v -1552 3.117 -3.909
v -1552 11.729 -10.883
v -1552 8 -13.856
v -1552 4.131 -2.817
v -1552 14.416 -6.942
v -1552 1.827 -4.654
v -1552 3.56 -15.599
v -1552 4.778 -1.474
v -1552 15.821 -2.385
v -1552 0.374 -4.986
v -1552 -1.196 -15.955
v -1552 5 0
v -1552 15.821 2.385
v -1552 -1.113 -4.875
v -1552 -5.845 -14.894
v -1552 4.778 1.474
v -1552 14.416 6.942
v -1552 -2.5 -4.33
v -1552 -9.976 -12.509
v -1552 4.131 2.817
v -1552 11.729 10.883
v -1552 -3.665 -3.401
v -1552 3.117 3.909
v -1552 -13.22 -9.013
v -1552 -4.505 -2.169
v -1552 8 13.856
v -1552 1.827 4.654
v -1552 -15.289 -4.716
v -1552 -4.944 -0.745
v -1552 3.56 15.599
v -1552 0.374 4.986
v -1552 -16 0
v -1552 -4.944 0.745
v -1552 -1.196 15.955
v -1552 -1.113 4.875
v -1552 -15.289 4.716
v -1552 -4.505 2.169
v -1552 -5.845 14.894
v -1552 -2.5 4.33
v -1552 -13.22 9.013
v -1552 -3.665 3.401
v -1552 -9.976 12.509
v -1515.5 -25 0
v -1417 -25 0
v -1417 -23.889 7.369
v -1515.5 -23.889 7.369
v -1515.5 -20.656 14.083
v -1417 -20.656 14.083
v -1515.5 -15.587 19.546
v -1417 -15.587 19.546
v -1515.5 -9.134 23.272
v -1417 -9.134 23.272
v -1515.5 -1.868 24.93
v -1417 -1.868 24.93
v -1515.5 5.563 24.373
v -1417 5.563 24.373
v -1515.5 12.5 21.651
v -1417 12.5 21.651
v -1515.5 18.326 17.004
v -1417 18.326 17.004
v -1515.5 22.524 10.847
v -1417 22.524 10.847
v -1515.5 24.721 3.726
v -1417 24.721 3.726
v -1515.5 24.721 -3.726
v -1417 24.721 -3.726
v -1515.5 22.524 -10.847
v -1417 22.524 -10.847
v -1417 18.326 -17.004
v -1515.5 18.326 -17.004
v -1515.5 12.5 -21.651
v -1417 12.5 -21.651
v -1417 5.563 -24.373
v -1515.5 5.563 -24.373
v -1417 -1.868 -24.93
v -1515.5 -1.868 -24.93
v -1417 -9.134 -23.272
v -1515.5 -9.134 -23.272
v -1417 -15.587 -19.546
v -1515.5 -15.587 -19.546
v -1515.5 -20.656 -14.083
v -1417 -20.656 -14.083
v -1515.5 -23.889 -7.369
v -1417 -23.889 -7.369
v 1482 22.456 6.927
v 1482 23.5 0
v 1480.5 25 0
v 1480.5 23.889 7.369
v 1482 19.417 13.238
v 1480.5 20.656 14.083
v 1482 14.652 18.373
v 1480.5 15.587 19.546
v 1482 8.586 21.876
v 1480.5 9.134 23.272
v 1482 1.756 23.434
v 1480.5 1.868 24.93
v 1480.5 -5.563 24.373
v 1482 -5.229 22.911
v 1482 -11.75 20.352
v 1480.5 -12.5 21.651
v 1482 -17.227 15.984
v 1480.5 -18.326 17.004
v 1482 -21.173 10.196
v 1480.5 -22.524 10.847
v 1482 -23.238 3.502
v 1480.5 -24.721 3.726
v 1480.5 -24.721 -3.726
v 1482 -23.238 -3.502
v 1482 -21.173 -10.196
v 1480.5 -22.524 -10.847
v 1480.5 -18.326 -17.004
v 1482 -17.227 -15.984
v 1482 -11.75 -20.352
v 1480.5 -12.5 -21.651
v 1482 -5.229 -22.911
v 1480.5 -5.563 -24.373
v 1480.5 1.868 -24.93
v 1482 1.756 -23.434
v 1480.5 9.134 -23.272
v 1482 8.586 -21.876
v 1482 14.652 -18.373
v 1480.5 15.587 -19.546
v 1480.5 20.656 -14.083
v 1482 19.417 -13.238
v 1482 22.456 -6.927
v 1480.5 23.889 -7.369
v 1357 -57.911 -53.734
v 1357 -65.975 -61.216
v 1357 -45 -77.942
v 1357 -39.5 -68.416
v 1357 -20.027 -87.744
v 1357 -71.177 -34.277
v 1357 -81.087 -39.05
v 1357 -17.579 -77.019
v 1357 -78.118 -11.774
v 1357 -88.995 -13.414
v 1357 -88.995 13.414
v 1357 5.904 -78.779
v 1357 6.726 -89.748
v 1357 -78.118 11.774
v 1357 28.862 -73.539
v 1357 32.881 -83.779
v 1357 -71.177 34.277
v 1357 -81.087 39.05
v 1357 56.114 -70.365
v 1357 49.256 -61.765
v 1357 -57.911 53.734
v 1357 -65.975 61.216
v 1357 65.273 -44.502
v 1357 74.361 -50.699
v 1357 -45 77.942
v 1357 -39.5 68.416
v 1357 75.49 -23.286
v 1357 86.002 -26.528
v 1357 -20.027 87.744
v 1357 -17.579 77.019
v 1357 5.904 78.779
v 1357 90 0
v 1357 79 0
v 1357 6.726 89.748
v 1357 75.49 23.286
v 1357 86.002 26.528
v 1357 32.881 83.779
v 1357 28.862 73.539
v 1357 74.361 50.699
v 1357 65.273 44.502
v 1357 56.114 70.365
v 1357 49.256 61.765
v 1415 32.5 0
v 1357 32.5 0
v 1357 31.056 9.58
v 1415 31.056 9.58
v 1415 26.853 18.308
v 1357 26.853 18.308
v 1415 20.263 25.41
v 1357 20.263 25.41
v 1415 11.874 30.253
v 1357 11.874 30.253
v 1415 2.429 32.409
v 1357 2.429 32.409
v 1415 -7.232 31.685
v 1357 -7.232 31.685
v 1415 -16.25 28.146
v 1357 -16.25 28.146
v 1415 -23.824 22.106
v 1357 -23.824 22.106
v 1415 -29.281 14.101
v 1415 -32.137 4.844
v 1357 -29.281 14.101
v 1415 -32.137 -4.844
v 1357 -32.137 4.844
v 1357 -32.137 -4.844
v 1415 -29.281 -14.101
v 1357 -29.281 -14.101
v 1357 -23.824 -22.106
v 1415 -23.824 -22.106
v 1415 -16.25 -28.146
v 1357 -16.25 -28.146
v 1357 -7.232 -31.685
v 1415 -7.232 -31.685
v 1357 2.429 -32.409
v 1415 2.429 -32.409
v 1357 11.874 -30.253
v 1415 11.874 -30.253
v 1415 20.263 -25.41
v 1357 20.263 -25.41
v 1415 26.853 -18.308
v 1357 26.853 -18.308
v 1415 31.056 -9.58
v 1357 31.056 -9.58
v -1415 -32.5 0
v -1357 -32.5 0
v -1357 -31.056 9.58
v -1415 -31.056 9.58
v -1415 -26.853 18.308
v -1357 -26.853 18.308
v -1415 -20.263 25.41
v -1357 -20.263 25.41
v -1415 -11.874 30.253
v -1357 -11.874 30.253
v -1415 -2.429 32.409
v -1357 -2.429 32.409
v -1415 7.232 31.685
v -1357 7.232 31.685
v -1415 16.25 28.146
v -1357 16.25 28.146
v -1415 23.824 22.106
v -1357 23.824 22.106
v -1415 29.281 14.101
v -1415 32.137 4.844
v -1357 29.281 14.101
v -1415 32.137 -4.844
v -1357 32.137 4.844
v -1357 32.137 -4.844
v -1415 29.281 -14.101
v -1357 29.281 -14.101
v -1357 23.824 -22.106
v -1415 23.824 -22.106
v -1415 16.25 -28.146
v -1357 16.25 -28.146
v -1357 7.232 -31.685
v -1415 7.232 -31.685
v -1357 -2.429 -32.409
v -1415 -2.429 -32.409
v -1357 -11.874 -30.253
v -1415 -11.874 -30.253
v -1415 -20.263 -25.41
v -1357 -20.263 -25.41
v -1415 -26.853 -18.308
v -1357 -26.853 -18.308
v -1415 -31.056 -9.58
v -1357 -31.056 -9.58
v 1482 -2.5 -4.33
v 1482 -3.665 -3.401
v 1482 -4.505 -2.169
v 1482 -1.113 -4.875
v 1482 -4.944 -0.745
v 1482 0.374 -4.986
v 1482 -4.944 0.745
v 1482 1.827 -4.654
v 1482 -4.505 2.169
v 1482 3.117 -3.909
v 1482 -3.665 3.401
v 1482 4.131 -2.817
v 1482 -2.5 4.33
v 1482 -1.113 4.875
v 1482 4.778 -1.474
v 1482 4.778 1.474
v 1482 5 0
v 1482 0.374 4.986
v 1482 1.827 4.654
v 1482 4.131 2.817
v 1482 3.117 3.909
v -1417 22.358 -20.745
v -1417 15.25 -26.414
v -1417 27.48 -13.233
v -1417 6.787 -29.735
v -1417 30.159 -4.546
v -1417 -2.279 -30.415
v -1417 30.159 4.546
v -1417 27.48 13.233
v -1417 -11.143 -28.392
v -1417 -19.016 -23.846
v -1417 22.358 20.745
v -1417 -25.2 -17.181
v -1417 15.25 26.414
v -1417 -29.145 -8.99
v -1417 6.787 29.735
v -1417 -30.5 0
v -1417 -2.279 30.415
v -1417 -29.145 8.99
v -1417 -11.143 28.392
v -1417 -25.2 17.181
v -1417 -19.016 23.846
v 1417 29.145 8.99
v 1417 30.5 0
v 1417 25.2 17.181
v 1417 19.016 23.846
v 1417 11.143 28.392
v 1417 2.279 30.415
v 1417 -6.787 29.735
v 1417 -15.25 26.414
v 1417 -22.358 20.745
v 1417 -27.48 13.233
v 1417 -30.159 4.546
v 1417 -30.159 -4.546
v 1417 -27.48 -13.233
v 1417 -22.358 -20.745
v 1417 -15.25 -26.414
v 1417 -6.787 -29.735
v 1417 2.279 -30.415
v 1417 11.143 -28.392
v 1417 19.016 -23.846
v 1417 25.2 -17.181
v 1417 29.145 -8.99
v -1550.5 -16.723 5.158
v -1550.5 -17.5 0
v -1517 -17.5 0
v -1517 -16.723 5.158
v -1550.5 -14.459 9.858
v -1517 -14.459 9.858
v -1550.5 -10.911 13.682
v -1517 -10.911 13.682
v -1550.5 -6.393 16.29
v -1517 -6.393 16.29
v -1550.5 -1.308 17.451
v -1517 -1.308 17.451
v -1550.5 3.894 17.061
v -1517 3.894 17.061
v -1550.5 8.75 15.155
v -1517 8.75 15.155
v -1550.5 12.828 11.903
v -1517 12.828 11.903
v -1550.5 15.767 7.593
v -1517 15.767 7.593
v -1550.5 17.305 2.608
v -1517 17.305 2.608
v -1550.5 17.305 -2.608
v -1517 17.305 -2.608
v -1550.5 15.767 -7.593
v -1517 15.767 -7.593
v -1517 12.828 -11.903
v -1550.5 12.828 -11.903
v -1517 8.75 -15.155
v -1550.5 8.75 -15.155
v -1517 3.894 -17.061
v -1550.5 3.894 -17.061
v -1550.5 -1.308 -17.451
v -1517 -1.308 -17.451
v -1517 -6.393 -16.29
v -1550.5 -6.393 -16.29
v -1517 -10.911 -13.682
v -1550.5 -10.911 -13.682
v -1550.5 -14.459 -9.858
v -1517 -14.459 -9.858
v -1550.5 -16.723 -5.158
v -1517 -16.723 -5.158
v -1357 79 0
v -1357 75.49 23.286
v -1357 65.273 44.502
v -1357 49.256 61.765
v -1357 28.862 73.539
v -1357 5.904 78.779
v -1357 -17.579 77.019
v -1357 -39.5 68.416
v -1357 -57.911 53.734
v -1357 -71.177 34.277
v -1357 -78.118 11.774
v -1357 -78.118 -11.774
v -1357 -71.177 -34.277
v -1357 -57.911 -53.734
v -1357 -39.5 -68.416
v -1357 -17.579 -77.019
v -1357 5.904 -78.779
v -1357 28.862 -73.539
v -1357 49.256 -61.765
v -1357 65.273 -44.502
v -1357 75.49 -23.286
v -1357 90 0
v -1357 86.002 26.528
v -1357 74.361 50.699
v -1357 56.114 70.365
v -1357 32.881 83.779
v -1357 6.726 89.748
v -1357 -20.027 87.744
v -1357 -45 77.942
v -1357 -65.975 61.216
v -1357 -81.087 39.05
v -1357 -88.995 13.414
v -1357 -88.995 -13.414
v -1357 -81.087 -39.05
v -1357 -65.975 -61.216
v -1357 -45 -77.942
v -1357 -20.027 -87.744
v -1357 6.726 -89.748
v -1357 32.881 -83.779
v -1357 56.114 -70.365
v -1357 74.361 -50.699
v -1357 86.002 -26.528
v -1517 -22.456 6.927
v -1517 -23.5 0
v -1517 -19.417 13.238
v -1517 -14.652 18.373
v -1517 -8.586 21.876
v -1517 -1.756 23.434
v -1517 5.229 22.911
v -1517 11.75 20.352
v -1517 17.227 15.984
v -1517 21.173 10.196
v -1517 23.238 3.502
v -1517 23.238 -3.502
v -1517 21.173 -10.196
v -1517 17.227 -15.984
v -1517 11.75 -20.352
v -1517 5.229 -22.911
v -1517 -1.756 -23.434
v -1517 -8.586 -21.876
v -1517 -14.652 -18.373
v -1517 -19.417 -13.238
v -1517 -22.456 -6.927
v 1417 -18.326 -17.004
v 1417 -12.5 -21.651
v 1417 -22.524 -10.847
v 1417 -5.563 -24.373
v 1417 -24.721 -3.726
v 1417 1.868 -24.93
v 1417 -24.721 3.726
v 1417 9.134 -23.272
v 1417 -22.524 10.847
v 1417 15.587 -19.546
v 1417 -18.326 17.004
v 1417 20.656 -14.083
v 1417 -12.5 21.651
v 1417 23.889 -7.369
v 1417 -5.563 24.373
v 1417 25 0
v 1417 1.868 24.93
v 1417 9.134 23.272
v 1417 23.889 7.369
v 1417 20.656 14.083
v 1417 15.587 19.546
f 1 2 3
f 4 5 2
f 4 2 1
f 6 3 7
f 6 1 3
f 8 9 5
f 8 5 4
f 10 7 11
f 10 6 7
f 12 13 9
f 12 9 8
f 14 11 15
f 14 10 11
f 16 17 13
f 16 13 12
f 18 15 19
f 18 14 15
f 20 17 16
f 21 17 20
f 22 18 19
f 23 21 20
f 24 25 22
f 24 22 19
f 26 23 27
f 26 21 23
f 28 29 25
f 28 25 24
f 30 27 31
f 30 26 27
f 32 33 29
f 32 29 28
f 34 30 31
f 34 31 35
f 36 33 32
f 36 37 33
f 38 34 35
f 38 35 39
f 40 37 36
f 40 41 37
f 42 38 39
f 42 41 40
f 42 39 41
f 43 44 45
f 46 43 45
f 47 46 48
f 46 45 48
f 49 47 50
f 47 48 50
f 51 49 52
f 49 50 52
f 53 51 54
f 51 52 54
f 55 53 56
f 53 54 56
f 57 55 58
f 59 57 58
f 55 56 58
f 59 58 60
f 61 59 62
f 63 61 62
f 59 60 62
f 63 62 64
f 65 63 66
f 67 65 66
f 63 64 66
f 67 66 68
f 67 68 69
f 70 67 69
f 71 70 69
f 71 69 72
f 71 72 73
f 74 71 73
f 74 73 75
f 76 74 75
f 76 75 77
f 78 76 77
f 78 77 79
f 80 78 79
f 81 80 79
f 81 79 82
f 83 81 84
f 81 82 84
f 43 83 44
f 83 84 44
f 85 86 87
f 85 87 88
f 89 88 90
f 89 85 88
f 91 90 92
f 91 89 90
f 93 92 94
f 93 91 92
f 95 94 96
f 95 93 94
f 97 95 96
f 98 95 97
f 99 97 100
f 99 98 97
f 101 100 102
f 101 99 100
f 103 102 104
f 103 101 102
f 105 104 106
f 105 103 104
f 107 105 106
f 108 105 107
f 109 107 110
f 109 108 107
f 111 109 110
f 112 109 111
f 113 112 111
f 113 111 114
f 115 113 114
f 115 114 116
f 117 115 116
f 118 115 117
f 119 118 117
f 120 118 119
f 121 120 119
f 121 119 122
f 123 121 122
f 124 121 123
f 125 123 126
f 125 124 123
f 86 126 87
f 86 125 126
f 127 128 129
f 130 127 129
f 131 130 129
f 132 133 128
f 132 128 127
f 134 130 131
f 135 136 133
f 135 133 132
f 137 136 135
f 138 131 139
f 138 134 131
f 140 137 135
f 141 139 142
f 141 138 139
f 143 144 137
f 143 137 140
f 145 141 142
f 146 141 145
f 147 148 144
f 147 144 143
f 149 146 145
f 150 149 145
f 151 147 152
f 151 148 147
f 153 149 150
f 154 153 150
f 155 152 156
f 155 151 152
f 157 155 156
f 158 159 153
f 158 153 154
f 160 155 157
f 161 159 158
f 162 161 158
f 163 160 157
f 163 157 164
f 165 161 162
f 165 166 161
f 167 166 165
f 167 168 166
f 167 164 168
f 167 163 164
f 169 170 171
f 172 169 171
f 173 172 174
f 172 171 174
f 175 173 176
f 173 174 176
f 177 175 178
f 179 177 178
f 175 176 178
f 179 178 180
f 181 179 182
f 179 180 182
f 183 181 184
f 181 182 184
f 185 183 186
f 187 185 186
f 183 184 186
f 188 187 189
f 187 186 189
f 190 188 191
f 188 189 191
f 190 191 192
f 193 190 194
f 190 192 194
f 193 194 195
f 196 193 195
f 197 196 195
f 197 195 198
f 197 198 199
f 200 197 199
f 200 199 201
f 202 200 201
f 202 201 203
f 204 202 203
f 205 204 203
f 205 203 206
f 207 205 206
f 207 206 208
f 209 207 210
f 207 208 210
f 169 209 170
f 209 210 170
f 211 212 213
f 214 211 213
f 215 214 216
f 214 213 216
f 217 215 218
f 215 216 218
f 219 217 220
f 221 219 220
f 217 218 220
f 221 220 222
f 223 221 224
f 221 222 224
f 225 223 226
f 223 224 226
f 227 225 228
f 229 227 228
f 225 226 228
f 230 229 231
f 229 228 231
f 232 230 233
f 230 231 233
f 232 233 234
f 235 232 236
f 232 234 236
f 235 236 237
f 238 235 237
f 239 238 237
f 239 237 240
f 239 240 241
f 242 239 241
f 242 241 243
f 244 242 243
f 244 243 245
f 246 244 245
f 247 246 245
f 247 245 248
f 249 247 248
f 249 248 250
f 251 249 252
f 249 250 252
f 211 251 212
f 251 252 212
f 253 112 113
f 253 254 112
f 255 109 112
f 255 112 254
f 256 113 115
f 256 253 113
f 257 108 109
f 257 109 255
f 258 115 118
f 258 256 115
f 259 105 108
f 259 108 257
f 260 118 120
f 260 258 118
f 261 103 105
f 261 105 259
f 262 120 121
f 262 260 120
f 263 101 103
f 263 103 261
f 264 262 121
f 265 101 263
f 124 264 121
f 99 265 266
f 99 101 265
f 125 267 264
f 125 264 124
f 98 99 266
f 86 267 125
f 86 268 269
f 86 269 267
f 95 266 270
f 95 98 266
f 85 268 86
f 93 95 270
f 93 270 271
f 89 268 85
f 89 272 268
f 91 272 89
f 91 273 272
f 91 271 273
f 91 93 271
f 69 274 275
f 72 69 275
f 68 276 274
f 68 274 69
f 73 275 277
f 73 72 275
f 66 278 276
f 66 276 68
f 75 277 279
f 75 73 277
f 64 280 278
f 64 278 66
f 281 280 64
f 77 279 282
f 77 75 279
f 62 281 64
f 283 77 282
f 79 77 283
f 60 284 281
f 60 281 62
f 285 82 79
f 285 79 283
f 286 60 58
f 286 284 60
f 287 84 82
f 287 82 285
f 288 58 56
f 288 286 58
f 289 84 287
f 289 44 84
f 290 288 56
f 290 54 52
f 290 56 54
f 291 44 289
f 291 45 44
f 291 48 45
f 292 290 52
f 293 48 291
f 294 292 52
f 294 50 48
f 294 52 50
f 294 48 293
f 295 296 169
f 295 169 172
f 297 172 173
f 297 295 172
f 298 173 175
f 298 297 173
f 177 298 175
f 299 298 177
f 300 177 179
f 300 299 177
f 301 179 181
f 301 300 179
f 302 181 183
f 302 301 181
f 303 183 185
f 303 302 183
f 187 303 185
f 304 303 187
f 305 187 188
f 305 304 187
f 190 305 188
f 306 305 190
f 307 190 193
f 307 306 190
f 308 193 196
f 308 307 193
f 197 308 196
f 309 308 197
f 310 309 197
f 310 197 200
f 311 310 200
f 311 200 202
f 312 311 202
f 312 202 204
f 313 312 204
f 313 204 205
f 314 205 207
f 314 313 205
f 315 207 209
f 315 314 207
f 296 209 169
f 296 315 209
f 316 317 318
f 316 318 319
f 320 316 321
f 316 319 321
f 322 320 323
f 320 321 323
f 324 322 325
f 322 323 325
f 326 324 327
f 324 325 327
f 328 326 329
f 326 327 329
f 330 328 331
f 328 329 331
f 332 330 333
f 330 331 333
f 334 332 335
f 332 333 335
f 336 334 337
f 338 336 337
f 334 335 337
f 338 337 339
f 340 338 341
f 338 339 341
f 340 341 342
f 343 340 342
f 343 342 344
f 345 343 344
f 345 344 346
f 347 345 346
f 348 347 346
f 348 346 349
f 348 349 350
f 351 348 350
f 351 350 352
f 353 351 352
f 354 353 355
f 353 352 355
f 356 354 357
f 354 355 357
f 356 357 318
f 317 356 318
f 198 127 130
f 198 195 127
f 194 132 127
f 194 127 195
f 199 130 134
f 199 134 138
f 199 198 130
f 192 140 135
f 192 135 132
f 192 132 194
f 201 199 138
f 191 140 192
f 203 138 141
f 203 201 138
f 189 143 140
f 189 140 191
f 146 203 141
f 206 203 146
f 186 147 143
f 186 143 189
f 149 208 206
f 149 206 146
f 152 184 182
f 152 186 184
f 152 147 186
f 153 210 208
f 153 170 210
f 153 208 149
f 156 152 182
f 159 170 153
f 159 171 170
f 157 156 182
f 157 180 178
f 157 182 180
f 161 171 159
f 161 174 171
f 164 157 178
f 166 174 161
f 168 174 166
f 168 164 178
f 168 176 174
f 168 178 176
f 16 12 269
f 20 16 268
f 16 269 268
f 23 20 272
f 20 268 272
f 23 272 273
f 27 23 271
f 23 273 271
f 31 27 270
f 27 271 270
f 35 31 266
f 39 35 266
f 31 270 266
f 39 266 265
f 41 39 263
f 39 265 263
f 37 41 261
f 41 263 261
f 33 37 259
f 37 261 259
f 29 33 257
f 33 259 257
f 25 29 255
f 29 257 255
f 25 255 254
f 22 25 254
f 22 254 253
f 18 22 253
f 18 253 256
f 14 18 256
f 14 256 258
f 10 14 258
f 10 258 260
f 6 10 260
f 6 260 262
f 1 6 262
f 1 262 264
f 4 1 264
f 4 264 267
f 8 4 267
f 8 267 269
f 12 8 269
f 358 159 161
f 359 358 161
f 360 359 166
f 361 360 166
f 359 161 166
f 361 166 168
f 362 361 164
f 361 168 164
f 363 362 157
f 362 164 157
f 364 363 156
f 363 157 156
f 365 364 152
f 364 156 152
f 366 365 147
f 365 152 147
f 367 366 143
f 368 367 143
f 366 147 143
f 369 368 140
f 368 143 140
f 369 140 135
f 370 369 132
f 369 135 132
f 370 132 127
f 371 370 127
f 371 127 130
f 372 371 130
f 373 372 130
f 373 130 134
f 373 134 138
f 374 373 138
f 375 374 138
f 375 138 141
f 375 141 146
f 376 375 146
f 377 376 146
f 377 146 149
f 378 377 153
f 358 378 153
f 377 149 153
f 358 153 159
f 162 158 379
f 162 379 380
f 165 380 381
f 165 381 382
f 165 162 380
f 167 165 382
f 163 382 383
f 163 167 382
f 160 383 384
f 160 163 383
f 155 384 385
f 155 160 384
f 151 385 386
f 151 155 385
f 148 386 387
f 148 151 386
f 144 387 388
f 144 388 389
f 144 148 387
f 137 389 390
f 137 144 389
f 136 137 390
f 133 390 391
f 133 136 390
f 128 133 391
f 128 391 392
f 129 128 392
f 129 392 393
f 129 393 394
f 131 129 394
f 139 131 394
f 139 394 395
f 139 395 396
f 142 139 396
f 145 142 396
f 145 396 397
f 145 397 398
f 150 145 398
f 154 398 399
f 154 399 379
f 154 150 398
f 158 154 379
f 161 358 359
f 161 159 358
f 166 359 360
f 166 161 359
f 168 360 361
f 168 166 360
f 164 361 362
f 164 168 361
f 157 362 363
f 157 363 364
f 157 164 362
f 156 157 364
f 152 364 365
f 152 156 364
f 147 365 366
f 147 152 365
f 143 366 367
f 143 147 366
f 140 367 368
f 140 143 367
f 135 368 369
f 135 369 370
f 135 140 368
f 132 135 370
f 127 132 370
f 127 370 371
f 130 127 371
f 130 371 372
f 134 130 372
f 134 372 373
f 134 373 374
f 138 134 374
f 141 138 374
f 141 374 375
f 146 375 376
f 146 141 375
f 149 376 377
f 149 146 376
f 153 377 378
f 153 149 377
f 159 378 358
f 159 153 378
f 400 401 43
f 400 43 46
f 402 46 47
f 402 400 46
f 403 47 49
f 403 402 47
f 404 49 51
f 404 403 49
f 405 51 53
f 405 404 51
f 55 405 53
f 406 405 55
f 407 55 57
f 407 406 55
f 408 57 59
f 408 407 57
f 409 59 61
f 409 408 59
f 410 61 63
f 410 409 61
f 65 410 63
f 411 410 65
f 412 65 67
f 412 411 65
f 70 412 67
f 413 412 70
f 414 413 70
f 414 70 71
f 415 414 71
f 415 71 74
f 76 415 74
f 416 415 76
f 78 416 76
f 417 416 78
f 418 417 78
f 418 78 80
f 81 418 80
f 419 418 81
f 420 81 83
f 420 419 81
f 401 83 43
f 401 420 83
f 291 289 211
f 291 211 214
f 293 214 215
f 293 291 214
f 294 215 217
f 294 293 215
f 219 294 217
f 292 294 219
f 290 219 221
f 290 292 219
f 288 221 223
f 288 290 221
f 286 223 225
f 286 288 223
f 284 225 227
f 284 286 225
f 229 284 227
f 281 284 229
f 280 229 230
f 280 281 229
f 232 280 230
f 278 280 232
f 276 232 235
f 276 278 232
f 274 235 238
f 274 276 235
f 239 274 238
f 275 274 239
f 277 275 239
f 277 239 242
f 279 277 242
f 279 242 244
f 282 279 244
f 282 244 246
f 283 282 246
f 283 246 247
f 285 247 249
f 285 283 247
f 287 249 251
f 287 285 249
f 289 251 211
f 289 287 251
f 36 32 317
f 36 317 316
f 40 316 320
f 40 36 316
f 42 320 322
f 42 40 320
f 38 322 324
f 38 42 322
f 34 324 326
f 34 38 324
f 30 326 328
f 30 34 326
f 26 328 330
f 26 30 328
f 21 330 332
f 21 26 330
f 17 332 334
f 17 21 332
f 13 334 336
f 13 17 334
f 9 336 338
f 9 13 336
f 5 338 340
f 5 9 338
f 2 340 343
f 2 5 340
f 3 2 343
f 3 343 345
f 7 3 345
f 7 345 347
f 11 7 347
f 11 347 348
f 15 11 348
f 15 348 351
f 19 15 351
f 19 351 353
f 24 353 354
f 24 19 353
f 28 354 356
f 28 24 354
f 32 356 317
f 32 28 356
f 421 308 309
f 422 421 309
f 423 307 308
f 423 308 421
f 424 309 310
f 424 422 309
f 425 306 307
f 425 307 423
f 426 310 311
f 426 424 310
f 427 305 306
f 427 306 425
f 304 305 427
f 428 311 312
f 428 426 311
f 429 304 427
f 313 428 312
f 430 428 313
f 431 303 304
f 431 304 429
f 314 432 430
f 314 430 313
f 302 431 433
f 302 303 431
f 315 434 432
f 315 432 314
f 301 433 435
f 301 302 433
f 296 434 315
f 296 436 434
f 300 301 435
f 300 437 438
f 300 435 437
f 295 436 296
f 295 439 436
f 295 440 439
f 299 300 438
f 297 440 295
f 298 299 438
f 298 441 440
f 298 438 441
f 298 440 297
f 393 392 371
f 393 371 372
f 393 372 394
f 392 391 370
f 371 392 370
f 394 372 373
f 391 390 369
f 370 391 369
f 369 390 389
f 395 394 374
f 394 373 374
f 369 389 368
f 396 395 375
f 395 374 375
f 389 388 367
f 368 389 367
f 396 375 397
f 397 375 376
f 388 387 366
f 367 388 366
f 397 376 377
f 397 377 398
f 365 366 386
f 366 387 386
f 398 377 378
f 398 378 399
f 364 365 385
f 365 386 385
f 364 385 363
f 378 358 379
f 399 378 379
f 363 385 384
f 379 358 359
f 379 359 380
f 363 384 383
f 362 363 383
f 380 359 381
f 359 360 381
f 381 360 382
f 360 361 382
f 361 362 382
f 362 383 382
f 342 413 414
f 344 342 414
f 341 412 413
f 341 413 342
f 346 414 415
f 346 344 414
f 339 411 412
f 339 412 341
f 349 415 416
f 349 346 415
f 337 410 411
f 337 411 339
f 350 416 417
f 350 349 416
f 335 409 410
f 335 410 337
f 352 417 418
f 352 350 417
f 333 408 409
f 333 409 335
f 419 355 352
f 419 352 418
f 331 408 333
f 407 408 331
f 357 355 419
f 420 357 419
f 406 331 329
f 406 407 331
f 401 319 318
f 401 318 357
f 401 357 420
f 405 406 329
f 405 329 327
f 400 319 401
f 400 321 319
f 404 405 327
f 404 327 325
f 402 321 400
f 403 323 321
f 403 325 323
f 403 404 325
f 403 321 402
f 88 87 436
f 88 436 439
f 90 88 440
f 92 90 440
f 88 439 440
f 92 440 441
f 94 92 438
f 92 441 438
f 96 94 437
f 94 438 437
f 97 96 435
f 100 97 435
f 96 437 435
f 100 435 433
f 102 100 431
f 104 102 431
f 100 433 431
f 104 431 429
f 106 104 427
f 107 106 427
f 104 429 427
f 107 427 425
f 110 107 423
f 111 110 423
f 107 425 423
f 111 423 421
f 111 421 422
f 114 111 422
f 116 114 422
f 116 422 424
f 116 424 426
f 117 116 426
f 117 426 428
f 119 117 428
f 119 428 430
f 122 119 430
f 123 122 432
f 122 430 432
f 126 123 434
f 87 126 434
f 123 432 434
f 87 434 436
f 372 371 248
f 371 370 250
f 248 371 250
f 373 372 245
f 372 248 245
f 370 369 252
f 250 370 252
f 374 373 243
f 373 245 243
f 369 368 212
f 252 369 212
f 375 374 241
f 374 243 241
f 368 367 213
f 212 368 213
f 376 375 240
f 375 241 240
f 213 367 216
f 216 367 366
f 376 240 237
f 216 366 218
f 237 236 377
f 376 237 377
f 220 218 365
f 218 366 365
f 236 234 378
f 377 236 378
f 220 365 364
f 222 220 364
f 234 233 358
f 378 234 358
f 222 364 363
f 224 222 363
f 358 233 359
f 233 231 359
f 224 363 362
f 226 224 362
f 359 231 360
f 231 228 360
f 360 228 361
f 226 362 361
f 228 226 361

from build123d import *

# Parameters (mm, degrees)
F0_R      = 79
F1_DEPTH  = 1357
F2_R      = 32.5
F3_DEPTH  = 60
F4_SIZE   = 2
F5_R      = 25
F6_DEPTH  = 65
F7_SIZE   = 1.5
F8_R      = 32.5
F9_DEPTH  = 60
F10_R     = 25
F11_DEPTH = 100
F12_R     = 17.5
F13_DEPTH = 35
F14_SIZE  = 2
F15_SIZE  = 1.5
F16_R     = 5
F17_DEPTH = 3034.001
F18_R     = 90
F18_R_2   = 79
F19_DEPTH = 2714


with BuildPart() as f1:
    # F0 (on Right) → F1 (new body, symmetric)
    with BuildSketch(Plane.YZ):
        Circle(F0_R)
    extrude(amount=F1_DEPTH, both=True)

    # F2 (on face) → F3 (join)
    with BuildSketch(Plane.YZ.offset(1357)):
        Circle(F2_R)
    extrude(amount=F3_DEPTH)

    # F4
    f4_edges = [f1.edges().sort_by_distance(p)[0] for p in [
        (1417, -32.5, 0),
    ]]
    chamfer(f4_edges, length=F4_SIZE)

    # F5 (on face) → F6 (join)
    with BuildSketch(Plane.YZ.offset(1417)):
        Circle(F5_R)
    extrude(amount=F6_DEPTH)

    # F7
    f7_edges = [f1.edges().sort_by_distance(p)[0] for p in [
        (1482, -25, 0),
    ]]
    chamfer(f7_edges, length=F7_SIZE)

    # F8 (on face) → F9 (join)
    with BuildSketch(Plane(origin=(-1357, 0, 0), x_dir=(0, -1, 0), z_dir=(-1, 0, 0))):
        Circle(F8_R)
    extrude(amount=F9_DEPTH)

    # F10 (on face) → F11 (join)
    with BuildSketch(Plane(origin=(-1417, 0, 0), x_dir=(0, -1, 0), z_dir=(-1, 0, 0))):
        Circle(F10_R)
    extrude(amount=F11_DEPTH)

    # F12 (on face) → F13 (join)
    with BuildSketch(Plane(origin=(-1517, 0, 0), x_dir=(0, -1, 0), z_dir=(-1, 0, 0))):
        Circle(F12_R)
    extrude(amount=F13_DEPTH)

    # F14
    f14_edges = [f1.edges().sort_by_distance(p)[0] for p in [
        (-1417, 32.5, 0),
    ]]
    chamfer(f14_edges, length=F14_SIZE)

    # F15
    f15_edges = [f1.edges().sort_by_distance(p)[0] for p in [
        (-1517, 25, 0),
        (-1552, 17.5, 0),
    ]]
    chamfer(f15_edges, length=F15_SIZE)

    # F16 (on face) → F17 (cut, through all)
    with BuildSketch(Plane.YZ.offset(1482)):
        Circle(F16_R)
    extrude(amount=-F17_DEPTH, mode=Mode.SUBTRACT)


with BuildPart() as f19:
    # F18 (on face) → F19 (new body, through all)
    with BuildSketch(Plane.YZ.offset(1357)):
        Circle(F18_R)
        Circle(F18_R_2, mode=Mode.SUBTRACT)
    extrude(amount=-F19_DEPTH)


solid = Compound([f1.part, f19.part])
